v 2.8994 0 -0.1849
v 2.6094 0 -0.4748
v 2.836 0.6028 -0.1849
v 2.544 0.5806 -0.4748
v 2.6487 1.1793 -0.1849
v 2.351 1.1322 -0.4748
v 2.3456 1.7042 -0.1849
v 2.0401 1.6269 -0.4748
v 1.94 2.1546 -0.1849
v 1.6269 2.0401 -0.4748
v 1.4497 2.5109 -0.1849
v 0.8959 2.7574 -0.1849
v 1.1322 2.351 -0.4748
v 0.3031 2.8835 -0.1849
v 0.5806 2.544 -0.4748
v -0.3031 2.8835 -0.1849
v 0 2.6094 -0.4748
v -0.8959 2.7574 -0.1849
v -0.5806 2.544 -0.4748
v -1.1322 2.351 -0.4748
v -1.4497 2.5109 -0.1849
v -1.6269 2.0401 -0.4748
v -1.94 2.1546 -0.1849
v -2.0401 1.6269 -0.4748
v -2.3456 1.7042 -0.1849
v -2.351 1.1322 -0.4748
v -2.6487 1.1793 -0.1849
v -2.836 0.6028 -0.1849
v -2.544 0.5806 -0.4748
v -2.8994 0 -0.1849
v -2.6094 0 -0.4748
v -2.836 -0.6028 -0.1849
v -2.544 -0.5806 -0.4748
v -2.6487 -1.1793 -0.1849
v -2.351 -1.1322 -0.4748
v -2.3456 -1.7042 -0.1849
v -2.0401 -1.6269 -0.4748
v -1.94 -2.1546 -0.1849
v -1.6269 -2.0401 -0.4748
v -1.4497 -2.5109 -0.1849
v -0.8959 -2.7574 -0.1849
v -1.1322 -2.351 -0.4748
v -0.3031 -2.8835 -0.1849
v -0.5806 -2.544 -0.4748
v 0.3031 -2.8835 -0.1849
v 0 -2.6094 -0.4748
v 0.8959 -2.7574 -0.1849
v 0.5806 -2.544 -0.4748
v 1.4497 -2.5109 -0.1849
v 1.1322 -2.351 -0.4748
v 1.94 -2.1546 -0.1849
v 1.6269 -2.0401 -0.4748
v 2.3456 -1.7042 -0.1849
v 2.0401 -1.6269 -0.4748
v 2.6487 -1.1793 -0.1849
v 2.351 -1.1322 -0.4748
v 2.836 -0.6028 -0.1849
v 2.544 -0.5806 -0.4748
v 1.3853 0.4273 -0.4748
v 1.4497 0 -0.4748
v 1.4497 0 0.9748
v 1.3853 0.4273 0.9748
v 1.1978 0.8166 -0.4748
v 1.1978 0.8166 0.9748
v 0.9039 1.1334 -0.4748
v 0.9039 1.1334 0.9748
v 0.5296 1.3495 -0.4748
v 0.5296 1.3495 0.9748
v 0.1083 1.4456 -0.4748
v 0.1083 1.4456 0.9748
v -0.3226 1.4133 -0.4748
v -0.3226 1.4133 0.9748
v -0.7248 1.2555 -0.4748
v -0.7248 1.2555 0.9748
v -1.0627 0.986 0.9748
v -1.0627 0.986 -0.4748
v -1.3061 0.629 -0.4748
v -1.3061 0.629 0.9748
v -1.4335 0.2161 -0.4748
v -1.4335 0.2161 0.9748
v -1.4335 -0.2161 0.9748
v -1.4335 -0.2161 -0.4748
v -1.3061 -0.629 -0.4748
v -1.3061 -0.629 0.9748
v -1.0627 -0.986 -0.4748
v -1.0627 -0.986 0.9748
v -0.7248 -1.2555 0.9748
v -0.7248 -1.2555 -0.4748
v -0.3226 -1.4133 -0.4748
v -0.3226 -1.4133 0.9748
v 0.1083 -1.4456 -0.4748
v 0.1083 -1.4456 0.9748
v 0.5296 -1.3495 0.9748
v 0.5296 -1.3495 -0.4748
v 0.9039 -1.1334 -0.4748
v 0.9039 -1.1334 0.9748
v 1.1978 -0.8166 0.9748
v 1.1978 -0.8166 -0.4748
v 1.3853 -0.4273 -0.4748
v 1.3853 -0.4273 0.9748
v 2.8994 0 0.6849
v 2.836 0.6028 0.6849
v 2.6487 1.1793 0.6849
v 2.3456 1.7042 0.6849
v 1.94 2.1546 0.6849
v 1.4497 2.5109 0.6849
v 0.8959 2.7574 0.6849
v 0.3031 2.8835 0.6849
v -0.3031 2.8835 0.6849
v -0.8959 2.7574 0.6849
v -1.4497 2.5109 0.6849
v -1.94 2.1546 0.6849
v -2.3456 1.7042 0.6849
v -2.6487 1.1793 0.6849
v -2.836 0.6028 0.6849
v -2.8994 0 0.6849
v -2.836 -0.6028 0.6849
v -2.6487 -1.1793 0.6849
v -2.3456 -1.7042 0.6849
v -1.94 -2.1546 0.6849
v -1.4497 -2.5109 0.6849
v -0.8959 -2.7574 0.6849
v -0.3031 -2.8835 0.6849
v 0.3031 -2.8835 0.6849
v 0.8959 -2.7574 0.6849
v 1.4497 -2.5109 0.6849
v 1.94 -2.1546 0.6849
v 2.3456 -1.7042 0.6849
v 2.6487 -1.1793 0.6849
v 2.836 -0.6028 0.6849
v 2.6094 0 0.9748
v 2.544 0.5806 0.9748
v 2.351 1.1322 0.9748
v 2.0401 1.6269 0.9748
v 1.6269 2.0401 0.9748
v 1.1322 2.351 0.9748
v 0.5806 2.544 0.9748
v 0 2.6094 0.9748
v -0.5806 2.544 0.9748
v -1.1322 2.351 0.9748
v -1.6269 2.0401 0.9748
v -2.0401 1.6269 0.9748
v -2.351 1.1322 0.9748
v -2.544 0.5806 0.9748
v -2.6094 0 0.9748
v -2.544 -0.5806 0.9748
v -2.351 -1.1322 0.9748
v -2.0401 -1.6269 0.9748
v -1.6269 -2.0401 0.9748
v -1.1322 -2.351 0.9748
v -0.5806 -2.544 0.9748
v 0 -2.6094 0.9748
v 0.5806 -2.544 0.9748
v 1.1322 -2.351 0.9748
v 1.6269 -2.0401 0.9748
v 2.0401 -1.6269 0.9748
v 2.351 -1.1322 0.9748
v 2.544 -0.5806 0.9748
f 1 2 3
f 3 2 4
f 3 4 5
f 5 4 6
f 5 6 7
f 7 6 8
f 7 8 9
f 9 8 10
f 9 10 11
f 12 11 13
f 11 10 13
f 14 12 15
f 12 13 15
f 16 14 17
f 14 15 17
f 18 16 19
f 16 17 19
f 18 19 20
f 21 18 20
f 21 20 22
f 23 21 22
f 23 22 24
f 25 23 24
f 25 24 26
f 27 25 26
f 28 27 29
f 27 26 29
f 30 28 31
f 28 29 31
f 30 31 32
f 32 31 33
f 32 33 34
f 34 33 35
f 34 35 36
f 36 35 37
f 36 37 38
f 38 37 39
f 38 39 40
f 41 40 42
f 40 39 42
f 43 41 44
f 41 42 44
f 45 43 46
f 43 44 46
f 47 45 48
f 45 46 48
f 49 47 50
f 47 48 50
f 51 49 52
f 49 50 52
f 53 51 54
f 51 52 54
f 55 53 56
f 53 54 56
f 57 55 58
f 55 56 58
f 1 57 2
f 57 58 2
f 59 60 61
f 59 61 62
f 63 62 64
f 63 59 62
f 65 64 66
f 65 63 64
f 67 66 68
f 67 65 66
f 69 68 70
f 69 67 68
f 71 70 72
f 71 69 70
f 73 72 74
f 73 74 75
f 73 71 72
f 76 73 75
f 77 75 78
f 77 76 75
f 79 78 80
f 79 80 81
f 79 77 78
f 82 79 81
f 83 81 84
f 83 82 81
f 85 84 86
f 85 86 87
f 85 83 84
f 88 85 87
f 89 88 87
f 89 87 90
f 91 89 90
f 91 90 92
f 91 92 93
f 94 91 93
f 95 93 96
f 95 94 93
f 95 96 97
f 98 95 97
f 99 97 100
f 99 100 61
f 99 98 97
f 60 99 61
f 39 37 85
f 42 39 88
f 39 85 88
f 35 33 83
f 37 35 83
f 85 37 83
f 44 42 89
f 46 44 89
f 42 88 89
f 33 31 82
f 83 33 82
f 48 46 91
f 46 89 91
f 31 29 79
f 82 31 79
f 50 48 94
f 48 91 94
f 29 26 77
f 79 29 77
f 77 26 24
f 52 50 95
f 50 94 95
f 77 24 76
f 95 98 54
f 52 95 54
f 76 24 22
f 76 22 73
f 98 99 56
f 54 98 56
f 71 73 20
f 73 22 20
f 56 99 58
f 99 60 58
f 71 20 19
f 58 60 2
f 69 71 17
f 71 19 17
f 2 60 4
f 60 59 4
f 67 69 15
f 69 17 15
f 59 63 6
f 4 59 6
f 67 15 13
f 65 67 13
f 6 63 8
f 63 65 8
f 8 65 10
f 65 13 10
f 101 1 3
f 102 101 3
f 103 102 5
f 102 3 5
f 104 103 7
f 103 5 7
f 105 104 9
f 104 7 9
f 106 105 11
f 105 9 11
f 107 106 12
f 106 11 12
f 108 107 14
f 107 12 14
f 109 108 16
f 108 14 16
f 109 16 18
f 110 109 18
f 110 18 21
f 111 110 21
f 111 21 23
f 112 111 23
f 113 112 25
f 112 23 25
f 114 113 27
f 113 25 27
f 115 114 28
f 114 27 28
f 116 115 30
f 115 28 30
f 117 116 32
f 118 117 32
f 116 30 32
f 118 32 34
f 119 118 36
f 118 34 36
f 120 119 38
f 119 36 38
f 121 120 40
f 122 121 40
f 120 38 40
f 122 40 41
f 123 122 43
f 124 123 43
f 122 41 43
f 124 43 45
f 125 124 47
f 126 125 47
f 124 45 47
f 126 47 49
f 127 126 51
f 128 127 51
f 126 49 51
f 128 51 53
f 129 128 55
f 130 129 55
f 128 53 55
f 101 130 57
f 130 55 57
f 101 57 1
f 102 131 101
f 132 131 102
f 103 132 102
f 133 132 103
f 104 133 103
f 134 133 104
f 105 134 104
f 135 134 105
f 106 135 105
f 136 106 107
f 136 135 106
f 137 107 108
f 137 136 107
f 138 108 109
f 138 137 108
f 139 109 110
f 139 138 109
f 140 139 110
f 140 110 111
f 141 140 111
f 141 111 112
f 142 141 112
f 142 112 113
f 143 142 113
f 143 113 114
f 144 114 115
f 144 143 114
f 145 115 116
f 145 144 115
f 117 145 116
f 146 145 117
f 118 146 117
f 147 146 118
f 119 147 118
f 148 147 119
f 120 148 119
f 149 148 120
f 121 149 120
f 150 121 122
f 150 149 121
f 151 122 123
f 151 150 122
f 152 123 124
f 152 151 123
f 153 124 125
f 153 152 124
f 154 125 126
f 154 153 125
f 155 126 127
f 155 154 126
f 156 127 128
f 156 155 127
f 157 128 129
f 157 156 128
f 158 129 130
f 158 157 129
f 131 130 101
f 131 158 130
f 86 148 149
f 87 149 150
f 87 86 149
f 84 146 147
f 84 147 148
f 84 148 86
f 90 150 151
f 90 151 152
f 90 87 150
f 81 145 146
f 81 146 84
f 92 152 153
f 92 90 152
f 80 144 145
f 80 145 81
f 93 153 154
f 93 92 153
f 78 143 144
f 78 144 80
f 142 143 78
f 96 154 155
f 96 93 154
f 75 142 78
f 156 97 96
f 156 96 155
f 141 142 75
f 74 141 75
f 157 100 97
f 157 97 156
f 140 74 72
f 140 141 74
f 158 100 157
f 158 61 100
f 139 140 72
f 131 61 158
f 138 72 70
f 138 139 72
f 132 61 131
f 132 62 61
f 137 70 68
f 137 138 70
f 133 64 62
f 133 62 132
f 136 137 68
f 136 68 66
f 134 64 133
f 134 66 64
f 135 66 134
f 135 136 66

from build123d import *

# Parameters (mm, degrees)
SKETCH1_R           = 1
SKETCH1_R_2         = 0.5
BOSS_EXTRUDE1_DEPTH = 0.5
CHAMFER1_SIZE       = 0.1
SCALE1_SCALE        = 1.9329
SCALE2_SCALE        = 1.5


with BuildPart() as part:
    # Sketch1 → Boss-Extrude1 (new body)
    with BuildSketch(Plane.XY):
        Circle(SKETCH1_R)
        Circle(SKETCH1_R_2, mode=Mode.SUBTRACT)
    extrude(amount=BOSS_EXTRUDE1_DEPTH)

    # Chamfer1
    chamfer1_edges = [part.edges().sort_by_distance(p)[0] for p in [
        (-1, 0, 0),
        (-1, 0, 0.5),
    ]]
    chamfer(chamfer1_edges, length=CHAMFER1_SIZE)


with BuildPart() as part_1:
    # Scale1: scaled about (0, 0, 0.25)
    add(part.part.scale(SCALE1_SCALE).moved(Location((0, 0, -0.233225))))


with BuildPart() as part_2:
    # Scale2: scaled about (0, 0, 0.25)
    add(part_1.part.scale(SCALE2_SCALE).moved(Location((0, 0, -0.125))))


solid = part_2.part
